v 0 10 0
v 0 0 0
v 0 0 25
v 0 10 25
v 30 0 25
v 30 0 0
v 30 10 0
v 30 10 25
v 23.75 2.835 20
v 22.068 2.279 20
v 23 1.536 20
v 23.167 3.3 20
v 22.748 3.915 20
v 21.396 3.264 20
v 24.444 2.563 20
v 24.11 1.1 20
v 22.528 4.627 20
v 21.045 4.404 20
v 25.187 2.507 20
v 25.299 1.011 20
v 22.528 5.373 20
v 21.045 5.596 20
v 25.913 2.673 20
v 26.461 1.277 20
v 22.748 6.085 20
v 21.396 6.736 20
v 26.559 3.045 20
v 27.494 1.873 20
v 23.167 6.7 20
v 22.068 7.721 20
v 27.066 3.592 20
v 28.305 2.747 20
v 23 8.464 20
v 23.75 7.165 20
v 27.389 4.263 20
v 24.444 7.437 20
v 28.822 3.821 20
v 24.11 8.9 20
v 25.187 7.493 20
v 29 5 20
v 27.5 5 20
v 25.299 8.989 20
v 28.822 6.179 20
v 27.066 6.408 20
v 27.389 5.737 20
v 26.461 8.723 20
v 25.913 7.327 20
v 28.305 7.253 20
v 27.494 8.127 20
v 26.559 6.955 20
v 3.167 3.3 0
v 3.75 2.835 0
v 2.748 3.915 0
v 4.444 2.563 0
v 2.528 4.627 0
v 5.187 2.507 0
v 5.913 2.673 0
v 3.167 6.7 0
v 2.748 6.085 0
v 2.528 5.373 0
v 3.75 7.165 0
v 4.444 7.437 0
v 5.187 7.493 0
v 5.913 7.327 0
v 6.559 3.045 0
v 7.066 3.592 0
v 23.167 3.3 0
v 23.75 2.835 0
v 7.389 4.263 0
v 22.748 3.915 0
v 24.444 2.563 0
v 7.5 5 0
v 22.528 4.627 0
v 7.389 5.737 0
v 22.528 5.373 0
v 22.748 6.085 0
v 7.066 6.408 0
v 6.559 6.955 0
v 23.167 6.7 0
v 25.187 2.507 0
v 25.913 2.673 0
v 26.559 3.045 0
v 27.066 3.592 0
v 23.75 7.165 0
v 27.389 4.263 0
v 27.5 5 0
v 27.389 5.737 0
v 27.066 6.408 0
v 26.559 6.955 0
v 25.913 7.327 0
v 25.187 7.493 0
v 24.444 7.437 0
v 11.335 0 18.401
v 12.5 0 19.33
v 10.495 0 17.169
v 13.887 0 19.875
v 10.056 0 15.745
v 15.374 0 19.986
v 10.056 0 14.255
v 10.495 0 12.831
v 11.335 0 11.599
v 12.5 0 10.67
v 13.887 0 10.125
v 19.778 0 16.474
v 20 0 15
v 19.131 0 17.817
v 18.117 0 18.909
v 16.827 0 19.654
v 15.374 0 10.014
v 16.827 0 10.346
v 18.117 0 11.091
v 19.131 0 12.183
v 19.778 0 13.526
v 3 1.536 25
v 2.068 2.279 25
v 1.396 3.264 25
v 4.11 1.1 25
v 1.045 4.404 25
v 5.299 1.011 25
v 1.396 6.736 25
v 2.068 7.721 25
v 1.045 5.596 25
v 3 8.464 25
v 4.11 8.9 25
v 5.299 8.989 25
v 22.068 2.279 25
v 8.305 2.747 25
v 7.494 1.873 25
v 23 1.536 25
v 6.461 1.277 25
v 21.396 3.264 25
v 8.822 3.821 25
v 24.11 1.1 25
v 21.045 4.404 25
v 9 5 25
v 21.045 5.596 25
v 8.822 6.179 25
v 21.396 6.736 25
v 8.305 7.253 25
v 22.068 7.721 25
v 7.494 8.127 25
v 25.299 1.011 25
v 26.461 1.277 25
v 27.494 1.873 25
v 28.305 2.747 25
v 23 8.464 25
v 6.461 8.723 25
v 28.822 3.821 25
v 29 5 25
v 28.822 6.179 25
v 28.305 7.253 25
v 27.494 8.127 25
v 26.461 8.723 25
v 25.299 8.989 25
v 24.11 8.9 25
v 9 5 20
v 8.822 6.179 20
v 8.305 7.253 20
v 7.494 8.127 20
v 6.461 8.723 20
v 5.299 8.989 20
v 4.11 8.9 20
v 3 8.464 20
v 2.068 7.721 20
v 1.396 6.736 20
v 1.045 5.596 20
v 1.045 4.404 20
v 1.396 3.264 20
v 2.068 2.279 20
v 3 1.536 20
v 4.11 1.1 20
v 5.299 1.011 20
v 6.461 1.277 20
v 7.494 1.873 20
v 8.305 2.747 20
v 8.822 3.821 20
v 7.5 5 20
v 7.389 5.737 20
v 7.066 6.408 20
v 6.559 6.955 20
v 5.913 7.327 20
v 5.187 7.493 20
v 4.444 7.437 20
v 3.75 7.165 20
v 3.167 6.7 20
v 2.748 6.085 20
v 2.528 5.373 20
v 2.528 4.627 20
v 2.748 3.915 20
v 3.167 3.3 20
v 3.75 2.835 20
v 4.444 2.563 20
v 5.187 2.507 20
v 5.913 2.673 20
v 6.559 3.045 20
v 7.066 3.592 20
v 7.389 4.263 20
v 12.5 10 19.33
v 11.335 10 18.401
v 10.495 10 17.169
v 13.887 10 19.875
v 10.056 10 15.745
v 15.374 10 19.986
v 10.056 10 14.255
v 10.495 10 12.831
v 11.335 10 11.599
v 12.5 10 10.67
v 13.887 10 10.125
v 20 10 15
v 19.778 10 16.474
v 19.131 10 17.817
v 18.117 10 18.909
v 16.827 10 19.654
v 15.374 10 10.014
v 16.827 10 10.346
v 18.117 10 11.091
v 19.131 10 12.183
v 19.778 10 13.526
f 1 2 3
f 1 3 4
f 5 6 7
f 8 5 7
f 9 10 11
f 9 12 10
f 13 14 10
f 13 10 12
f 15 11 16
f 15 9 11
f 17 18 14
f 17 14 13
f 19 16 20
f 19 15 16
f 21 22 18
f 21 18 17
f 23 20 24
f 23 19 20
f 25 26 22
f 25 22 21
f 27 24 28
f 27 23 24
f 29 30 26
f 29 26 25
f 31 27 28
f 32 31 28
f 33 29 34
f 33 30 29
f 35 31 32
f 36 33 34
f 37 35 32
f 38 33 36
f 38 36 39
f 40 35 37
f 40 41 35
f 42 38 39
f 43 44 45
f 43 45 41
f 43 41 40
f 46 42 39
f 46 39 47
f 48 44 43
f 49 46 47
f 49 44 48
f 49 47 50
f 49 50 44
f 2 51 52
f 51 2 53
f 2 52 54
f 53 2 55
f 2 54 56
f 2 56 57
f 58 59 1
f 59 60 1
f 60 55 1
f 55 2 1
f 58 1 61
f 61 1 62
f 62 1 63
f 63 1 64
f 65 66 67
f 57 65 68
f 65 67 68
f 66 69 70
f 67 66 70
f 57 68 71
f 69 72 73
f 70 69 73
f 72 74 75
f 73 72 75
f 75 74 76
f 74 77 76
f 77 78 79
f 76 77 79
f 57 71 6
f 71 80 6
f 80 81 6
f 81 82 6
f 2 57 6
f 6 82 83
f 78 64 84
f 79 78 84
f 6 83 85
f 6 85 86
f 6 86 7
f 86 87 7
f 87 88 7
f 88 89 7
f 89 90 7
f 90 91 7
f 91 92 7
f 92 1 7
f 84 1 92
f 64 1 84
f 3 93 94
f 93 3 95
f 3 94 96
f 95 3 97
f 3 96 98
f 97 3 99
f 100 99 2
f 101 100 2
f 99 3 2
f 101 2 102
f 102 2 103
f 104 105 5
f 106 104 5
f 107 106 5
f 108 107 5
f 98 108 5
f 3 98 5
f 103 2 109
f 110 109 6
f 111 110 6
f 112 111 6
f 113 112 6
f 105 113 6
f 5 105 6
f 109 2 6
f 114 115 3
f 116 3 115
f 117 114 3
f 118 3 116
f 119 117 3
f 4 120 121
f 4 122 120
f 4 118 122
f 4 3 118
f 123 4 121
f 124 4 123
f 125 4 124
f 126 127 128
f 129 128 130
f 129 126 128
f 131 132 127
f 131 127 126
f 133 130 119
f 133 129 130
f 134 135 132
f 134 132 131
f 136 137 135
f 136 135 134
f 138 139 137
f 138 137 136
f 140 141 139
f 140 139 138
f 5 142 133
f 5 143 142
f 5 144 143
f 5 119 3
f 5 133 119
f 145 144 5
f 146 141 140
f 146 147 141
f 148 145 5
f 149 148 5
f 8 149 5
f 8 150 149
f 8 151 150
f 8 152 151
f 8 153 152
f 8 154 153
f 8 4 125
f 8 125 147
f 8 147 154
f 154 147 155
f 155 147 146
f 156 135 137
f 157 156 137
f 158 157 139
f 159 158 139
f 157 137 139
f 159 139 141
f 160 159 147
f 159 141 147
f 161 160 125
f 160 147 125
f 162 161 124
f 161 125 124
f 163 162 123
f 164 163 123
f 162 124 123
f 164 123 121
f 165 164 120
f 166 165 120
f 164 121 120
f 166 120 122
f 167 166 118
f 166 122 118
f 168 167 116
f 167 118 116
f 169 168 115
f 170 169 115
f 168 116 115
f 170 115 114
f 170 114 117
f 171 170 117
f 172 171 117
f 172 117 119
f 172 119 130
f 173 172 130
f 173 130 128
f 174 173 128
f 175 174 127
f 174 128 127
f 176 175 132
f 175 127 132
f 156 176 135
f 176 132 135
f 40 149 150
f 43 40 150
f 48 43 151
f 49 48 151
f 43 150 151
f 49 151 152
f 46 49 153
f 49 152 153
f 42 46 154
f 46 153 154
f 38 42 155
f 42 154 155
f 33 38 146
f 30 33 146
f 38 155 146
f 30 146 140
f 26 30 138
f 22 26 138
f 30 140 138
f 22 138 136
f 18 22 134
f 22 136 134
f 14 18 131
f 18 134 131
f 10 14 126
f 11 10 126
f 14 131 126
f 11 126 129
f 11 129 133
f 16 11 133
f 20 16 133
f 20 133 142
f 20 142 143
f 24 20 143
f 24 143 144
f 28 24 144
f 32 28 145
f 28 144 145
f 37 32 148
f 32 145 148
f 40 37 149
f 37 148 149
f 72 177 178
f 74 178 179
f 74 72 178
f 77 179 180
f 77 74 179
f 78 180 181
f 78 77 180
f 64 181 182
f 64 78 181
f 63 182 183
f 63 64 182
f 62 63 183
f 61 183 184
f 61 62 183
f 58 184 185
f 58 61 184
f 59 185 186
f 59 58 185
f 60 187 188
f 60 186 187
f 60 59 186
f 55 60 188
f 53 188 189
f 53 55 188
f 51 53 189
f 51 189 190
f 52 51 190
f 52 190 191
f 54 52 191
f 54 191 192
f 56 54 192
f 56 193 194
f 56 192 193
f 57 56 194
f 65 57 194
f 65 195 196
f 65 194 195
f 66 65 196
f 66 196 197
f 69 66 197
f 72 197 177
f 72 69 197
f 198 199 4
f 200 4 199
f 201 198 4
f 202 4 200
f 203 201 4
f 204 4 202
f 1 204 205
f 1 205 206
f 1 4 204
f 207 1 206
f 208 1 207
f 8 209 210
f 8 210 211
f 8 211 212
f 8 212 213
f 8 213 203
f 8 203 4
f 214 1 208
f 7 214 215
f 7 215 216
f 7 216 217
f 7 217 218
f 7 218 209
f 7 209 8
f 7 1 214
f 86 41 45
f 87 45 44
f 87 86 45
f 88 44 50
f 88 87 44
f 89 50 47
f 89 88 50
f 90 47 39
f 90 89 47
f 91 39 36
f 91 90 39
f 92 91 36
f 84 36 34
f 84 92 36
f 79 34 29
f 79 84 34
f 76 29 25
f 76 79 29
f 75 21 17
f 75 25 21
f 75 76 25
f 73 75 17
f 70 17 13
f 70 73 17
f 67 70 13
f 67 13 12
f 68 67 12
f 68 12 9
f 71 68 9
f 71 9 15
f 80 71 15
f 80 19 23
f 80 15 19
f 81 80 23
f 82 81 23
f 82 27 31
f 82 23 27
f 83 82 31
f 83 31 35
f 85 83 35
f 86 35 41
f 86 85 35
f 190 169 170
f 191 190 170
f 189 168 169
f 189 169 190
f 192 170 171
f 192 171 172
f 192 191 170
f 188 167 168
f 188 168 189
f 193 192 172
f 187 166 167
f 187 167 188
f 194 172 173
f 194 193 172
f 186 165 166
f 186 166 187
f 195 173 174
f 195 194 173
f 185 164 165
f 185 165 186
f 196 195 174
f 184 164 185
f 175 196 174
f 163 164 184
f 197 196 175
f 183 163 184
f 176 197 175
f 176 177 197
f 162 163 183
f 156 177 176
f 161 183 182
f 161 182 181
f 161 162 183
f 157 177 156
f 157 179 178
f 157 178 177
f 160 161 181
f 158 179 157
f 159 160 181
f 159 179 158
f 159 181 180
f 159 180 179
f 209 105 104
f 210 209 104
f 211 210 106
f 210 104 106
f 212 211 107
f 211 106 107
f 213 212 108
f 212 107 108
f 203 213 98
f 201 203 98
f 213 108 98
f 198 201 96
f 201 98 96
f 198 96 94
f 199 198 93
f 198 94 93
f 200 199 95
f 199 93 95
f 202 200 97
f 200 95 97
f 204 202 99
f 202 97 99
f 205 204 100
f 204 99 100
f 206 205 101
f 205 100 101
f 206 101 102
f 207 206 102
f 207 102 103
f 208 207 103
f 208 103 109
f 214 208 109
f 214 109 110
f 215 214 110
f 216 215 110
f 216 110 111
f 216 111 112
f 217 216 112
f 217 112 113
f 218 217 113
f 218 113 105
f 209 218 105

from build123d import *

# Parameters (mm, degrees)
F0_W     = 30
F0_H     = 10
F0_R     = 2.5
F1_DEPTH = 25
F2_R     = 4
F3_DEPTH = 5
F4_R     = 5
F5_DEPTH = 25


with BuildPart() as f1:
    # F0 (on Top) → F1 (new body)
    with BuildSketch(Plane.XY):
        with Locations((15, 5)):
            Rectangle(F0_W, F0_H)
        with Locations((5, 5)):
            Circle(F0_R, mode=Mode.SUBTRACT)
        with Locations((25, 5)):
            Circle(F0_R, mode=Mode.SUBTRACT)
    extrude(amount=F1_DEPTH)

    # F2 (on face) → F3 (cut)
    with BuildSketch(Plane.XY.offset(25)):
        with Locations((5, 5)):
            Circle(F2_R)
        with Locations((25, 5)):
            Circle(F2_R)
    extrude(amount=-F3_DEPTH, mode=Mode.SUBTRACT)

    # F4 (on face) → F5 (cut)
    with BuildSketch(Plane.XZ):
        with Locations((15, 15)):
            Circle(F4_R)
    extrude(amount=-F5_DEPTH, mode=Mode.SUBTRACT)


solid = f1.part
